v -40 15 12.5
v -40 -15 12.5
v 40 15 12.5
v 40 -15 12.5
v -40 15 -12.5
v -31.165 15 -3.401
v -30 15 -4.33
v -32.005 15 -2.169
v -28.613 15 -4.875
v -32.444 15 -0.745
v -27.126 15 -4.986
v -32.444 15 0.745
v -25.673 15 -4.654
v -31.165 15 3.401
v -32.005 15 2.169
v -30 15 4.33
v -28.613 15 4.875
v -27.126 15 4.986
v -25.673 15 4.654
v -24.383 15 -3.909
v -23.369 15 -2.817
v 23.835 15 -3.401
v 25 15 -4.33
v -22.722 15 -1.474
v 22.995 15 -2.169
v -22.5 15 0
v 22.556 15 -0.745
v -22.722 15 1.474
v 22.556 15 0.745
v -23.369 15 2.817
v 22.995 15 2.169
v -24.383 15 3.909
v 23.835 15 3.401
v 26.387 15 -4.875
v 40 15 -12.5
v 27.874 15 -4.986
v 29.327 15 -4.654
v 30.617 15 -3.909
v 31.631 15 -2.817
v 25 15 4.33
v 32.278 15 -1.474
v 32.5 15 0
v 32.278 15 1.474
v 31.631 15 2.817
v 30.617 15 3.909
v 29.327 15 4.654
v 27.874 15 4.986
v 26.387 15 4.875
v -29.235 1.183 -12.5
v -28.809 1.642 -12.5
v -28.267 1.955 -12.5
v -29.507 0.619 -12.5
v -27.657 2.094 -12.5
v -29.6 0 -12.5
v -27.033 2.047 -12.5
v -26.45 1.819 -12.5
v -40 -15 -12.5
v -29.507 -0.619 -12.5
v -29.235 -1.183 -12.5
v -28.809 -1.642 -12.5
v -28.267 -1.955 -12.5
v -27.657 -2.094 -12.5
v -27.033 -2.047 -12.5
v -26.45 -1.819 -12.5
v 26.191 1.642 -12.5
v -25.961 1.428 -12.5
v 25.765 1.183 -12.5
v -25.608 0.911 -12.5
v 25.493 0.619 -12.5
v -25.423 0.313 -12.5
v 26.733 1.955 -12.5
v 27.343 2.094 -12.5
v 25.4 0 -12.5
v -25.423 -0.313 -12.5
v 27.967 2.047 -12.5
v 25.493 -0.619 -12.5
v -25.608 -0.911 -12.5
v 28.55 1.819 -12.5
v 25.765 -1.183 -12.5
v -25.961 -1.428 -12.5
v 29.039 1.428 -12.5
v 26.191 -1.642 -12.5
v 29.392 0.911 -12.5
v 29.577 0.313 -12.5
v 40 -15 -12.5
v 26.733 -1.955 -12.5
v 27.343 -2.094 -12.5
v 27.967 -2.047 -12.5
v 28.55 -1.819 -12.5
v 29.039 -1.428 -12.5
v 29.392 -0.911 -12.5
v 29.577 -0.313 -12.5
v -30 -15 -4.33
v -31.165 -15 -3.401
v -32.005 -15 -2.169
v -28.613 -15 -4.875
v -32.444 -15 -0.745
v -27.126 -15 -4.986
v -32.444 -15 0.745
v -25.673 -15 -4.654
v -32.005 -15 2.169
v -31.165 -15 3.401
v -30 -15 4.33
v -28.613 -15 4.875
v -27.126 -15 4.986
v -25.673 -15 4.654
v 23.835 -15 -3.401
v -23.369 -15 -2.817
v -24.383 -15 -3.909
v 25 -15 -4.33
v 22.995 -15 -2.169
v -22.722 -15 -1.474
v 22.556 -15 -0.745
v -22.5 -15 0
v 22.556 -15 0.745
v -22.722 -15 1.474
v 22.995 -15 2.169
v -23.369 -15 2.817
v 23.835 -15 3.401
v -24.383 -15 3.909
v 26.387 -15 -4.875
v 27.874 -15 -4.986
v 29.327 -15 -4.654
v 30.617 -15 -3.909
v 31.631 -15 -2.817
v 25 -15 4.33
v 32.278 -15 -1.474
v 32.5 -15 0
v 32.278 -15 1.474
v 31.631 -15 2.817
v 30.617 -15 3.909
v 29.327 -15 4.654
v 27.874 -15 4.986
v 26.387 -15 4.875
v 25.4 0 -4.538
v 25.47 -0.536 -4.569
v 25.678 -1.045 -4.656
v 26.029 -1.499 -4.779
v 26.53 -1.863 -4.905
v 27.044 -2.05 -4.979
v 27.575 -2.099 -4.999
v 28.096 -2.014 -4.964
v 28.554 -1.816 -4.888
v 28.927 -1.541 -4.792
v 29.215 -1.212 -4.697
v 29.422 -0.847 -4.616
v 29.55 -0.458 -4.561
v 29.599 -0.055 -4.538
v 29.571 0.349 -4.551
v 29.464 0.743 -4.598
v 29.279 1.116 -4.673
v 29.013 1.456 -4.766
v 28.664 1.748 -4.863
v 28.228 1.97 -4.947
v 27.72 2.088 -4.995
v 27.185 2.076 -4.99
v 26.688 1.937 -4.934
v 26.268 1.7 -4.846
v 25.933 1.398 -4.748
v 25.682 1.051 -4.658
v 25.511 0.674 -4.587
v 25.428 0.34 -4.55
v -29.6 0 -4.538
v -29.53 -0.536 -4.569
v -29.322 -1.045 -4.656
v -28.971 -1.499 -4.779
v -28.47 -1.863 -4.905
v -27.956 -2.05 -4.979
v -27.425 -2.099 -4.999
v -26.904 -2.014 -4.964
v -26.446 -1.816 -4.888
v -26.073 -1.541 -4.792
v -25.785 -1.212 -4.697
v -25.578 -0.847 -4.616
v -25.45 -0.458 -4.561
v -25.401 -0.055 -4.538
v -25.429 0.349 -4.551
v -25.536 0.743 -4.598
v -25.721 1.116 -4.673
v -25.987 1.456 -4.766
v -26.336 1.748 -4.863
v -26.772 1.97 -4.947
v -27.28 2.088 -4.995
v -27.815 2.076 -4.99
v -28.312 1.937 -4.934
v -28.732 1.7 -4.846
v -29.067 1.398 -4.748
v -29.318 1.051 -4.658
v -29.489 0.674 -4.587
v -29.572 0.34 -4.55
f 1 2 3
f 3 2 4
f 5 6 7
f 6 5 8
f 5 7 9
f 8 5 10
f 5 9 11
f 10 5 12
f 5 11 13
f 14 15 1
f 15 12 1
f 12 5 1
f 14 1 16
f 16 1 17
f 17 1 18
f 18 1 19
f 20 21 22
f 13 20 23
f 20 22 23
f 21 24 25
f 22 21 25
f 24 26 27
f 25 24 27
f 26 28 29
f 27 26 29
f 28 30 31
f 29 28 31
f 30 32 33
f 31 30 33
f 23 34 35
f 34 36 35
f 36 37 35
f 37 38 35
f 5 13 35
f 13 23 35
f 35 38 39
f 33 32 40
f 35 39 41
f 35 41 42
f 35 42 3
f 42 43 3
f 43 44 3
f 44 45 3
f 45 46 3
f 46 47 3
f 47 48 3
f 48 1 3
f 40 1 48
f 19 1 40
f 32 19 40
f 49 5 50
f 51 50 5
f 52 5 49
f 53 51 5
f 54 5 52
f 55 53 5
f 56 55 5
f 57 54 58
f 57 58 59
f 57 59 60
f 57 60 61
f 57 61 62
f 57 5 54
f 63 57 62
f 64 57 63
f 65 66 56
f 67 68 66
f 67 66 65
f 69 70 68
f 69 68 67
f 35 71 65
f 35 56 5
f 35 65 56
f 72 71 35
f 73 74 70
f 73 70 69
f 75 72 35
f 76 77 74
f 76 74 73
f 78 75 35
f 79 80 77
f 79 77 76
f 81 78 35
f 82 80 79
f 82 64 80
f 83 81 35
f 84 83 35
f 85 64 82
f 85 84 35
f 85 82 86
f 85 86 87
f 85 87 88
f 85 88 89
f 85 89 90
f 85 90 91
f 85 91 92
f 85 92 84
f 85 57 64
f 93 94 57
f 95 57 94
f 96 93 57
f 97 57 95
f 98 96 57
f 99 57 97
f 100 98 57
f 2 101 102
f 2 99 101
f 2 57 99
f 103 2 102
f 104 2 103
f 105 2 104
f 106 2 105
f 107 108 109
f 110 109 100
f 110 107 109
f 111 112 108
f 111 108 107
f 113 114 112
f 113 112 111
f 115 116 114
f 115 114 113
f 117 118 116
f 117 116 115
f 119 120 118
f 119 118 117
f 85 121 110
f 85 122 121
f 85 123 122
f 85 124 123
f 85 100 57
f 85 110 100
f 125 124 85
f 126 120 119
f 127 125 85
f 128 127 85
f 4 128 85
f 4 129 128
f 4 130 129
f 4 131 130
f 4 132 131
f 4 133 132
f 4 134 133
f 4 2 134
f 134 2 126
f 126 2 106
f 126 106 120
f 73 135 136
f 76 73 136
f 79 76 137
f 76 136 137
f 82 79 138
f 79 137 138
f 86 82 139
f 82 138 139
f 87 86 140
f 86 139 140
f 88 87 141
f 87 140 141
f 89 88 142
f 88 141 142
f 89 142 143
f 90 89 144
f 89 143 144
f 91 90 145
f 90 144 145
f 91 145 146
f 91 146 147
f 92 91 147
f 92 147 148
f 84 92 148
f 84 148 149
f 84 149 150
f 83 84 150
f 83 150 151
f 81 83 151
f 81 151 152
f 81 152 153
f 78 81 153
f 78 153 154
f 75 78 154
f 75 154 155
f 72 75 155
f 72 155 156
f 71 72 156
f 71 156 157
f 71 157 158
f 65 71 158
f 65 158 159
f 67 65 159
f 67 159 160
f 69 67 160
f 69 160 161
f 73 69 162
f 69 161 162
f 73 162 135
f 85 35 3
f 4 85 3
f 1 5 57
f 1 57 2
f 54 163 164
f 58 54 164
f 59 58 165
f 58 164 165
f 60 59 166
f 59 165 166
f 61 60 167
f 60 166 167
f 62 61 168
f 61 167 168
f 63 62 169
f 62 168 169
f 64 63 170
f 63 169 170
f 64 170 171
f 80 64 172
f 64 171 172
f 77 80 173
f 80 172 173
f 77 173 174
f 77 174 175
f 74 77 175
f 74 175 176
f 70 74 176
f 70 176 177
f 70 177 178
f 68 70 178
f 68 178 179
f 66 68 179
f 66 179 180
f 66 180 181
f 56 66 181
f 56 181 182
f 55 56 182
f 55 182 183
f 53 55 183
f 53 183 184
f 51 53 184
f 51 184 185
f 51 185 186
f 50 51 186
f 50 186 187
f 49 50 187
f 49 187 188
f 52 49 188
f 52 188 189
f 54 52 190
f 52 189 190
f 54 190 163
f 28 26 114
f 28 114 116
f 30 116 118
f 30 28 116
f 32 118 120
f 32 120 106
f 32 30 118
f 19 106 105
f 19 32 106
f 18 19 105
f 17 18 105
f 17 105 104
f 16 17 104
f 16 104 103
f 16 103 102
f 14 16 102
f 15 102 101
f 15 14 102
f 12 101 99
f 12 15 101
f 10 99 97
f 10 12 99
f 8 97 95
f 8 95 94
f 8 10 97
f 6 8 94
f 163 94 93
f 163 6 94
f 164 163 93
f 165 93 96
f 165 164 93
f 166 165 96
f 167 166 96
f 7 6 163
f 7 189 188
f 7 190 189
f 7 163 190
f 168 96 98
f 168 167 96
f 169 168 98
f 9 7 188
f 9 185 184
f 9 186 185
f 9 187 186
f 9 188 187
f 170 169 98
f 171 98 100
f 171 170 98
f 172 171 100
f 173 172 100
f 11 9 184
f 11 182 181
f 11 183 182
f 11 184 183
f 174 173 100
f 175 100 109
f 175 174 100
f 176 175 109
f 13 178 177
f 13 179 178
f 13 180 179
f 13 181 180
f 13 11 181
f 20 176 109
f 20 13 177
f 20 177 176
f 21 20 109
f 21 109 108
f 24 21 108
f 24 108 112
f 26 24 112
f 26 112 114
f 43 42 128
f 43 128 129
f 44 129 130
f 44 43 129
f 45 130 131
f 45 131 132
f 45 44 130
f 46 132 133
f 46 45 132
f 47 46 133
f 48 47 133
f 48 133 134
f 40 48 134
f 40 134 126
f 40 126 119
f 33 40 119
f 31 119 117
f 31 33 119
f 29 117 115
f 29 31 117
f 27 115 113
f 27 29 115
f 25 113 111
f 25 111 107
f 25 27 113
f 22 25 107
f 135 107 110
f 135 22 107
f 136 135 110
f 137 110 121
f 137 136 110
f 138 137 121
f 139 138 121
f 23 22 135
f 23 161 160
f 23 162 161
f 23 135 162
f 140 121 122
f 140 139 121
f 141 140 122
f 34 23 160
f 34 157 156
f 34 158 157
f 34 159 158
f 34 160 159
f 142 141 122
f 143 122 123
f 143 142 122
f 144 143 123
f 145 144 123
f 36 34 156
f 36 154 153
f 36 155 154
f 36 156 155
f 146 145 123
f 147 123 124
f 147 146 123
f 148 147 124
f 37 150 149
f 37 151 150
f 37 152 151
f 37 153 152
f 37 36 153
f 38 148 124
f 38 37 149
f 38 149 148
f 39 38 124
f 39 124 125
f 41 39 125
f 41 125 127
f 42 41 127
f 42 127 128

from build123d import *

# Parameters (mm, degrees)
F0_W     = 80
F0_H     = 25
F0_R     = 5
F1_DEPTH = 15
F3_D     = 4.2
F3_DEPTH = 14.4
F3_TIP   = 1.2618073


with BuildPart() as f1:
    # F0 (on Front) → F1 (new body, symmetric)
    with BuildSketch(Plane.XZ):
        Rectangle(F0_W, F0_H)
        with Locations((-27.5, 0)):
            Circle(F0_R, mode=Mode.SUBTRACT)
        with Locations((27.5, 0)):
            Circle(F0_R, mode=Mode.SUBTRACT)
    extrude(amount=F1_DEPTH, both=True)

    # F3
    with Locations(Plane(origin=(0, 0, -12.5), x_dir=(1, 0, 0), z_dir=(0, 0, -1))):
        with Locations((-27.5, 0), (27.5, 0)):
            Hole(F3_D / 2, depth=F3_DEPTH)
            with Locations((0, 0, -(F3_DEPTH + F3_TIP / 2))):  # 118° drill point
                Cone(0, F3_D / 2, F3_TIP, mode=Mode.SUBTRACT)


solid = f1.part
